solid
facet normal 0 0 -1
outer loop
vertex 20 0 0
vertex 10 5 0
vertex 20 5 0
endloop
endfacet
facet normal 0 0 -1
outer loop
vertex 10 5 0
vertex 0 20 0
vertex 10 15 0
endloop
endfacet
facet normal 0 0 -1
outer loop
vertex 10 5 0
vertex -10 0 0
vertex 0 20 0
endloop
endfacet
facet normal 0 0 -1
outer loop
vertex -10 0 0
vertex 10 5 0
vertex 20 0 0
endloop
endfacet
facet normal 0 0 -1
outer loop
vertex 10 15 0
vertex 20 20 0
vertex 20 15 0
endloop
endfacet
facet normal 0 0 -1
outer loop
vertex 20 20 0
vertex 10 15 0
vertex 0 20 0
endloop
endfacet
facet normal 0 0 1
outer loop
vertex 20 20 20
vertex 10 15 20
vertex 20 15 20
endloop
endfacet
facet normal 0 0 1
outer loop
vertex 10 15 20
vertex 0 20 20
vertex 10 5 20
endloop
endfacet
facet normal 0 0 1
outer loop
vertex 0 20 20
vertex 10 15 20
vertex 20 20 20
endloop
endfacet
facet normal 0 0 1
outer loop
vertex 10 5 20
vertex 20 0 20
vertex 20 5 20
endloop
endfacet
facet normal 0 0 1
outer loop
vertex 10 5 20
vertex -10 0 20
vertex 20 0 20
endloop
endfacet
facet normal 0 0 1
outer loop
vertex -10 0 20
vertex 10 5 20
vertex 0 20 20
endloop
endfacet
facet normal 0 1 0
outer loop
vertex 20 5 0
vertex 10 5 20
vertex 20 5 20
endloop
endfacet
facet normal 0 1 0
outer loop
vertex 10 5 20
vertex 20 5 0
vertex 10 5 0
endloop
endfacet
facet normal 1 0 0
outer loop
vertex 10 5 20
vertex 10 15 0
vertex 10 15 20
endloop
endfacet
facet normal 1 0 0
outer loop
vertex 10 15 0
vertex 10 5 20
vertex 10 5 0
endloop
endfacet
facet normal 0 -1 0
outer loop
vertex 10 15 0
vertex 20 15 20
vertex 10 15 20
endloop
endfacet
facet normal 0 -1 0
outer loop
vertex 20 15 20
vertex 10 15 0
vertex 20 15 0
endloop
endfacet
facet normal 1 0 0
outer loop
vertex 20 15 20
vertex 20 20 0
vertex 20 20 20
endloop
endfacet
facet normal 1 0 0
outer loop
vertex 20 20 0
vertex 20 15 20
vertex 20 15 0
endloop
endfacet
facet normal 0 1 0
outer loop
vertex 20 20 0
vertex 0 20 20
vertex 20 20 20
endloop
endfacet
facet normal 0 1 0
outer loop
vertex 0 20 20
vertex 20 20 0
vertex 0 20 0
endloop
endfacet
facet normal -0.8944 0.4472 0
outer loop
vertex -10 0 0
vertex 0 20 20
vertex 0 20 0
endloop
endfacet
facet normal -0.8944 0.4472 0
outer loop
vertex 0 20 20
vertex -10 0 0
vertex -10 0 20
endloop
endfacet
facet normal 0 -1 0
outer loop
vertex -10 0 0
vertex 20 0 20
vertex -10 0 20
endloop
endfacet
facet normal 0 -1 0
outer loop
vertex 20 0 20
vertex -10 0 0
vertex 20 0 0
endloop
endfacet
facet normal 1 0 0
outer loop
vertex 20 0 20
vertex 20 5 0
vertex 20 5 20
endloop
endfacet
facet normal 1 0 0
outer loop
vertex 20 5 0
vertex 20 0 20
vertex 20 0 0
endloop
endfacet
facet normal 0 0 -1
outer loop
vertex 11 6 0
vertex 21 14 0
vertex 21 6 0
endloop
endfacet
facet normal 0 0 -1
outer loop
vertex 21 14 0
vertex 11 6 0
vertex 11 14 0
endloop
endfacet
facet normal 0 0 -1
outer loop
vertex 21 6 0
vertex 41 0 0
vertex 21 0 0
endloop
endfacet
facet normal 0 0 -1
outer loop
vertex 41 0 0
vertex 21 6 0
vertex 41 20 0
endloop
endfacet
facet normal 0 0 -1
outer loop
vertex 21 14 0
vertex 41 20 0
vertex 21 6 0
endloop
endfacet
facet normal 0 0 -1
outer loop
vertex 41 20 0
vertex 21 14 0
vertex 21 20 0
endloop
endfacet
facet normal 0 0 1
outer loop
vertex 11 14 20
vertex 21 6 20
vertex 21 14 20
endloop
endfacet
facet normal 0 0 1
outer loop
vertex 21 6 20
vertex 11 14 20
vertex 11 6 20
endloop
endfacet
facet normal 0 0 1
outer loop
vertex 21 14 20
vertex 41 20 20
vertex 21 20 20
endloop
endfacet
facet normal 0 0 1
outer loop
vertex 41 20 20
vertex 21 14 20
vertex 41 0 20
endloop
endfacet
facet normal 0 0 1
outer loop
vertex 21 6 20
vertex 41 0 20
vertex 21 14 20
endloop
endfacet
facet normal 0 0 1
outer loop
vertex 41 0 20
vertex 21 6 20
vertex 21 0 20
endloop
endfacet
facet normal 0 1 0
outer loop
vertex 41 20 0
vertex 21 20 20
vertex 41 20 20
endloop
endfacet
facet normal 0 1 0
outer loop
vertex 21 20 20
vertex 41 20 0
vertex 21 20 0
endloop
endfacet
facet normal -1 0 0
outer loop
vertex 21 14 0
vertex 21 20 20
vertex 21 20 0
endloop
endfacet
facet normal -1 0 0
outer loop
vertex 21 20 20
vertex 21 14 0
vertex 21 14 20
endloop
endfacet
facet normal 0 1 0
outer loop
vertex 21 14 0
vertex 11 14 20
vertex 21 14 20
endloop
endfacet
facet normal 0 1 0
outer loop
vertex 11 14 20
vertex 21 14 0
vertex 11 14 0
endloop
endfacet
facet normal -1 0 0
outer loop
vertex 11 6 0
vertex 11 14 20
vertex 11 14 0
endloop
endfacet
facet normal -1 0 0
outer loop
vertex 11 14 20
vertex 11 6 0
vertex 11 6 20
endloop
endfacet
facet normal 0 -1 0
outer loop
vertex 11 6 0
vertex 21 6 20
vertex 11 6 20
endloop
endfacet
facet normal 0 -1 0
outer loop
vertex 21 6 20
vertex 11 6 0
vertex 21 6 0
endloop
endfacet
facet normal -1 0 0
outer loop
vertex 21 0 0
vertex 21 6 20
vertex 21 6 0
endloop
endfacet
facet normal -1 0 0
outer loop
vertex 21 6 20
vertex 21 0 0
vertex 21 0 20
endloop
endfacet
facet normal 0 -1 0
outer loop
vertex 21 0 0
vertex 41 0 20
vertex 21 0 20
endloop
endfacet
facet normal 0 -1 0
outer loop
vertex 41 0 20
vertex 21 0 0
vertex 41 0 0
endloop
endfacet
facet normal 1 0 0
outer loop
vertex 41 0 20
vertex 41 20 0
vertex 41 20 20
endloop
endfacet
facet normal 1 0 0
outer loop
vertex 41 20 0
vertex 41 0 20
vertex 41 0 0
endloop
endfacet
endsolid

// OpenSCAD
// file: hull.scad
/*
hull.scad - a library that leverages the hull() procedure
Author: Elliot Williams
github: https://gist.github.com/hexagon5un )
source: https://gist.github.com/hexagon5un/73e187dfa0404c69177795424f397ce6#file-hull-scad

Featured in the hackaday atricle: 'OPENSCAD: TIEING IT TOGETHER WITH HULL()'
https://hackaday.com/2018/02/13/openscad-tieing-it-together-with-hull/
*/
module multiHull(){
	for (i = [1 : $children-1])
		hull(){
			children(0);
			children(i);
		}
}

module sequentialHull(){
	for (i = [0: $children-2])
		hull(){
			children(i);
			children(i+1);
		}
}

/* Extended fun hull functions */ 

module cylinders(points, diameter, thickness){
	for (p=points){
		translate(p) cylinder(d=diameter, h=thickness, center=true);
	}
}

module plate(points, diameter, thickness, hole_diameter){
	difference(){
		hull() cylinders(points, diameter, thickness);
		cylinders(points, hole_diameter, 1000);
	}
}

module bar(length, width, thickness, hole_diameter){
	plate([[0,0,0], [length,0,0]], width, thickness, hole_diameter);
}

module rounded_box(points, radius, height, facets=30){
	hull(){
		for (p = points){
			translate(p)
				cylinder(r=radius, h=height, $fn=facets);
		}
	}
}

module point_cloud(points, radius=1, facets=8){
	for (p=points){
		translate(p)
			sphere(radius/cos(180/facets), $fn=facets);
		// polygon sphere circumscribed on radius
	}
}

module point_hull(points, radius=1, facets=8){
	hull(){
		point_cloud(points, radius, facets);
	}
}

// Shrink the exterior of the points so that the hull fits inside
function select(vector, i) = [ for (p=vector) p[i] ];
function axis_center(v, i) = (max(select(v, i)) - min(select(v,i)))/2;
function center(v) = [ for (i = [0,1,2]) axis_center(v, i) ];
function shrink_point(point, center, radius) = [ for (i = [0,1,2]) point[i] > center[i] ? point[i] - radius : point[i] + radius ]; 
function shrink(points, radius) = [ for (p = points) shrink_point(p, center(points), radius) ];

module interior_point_hull(points, radius=1){
	point_hull(shrink(points, radius), radius);
}

module interior_rounded_box(points, radius, height){
	rounded_box(shrink(points, radius), radius, height);
}


module mirror_copy(v = [1, 0, 0]) {
    children();
    mirror(v) children();
}
// file: basics.scad
///< Basics module
use <math.scad>;
use <utils.scad>;
use <hull.scad>;

module triangle( w, d, h ){
     difference(){
	  hyp = hyp_from_sides( d, h );
	  color( "red" )cube( [w, d, h] );
	  rotate( [ 45, 0, 0 ] )
	       translate( [ -0.01, 0, 0 ] )
	       color( "green" )cube( [w+0.2, hyp, h] );
     }
}

module tri_xy(pt1, pt2, pt3, h=1) {
     color( rands( 0,1,3 ) ) linear_extrude( height=h )
	  polygon( points=[ pt1, pt2, pt3 ] );
}

module triangle_xy( pts, h=1) {
     color( rands( 0,1,3 ) ) linear_extrude( height=h )
	  polygon( points = pts );
}

module oval(w,l, height, center = false, fn = 30) {
 scale([1, l/w, 1]) cylinder(h=height, r=w, center=center, $fn = fn);
}

module pipe( outer, inner, height, fn = 60 ){
     offset_percent = 0.25;
     inner_h = height + (offset_percent * 2 );
     difference(){
     ///< Debug with union(){
	  cylinder(r=outer, h = height, $fn = fn );
	  translate([0,0,-offset_percent]){
	       color("green",0.5)cylinder(r=inner, h = inner_h, $fn = fn );
	  }
     }
}

module rounded_pipe( r, h, fn = 60 ){
     cylinder(r = r, h = h, $fn = fn );

     color("blue")
     translate([0,0,h])
	  sphere(r, $fn = fn );

     color("red")
     translate([0,0,0])
	  sphere(r, $fn = fn );
}

/// Stackoverflow example module for a line
/// https://stackoverflow.com/questions/49533350/is-that-possible-to-draw-a-line-using-openscad-by-joining-different-points
module line(start, end, thickness = 1, fn = 30) {
    hull() {
	translate(start) sphere(thickness, $fn = fn);
	translate(end) sphere(thickness, $fn = fn);
    }
}


/*
Hulled box:

Parameterized box with rounded corners. This uses the hull.scad
to hull four cylinders around four point in space. This variation
offsets the box to zero/zero and takes in w,d,h to mesh better
with tuples.
*/
module hulled_cube( w, d, h, r = 1 ){
    points = [
	[ 0, 0, 0 ],
	[ w, 0, 0 ],
	[ 0, w, 0 ],
	[ w, w, 0 ],
	];
    resize( [w,d,h]){
	translate( [r, r,0] ){
	    rounded_box( points, radius = r, height=h );
	}
    }
}
// file: utils.scad
///< Utilities

function rand_clr() = rands( 0,1,3 );

///< Length conversions
function in2mm( i ) = ( i * 25.4 ); 
function mm2in( m ) = ( m / 25.4 );

/// This is pulled from stackoverflow
/// https://stackoverflow.com/questions/45826208/openscad-rotating-around-a-particular-point

// rotate as per a, v, but around point pt
module rotate_about_pt(a, v, pt) {
    translate(pt)
        rotate(a,v)
            translate(-pt)
                children();   
}
// file: math.scad
///< Math scad module


///< Find the hypotenuse from two sides of a right triangle
function hyp_from_sides( a, b ) = sqrt( pow( a, 2 ) + pow( b, 2 ) );

///< Find equal sides from hypotenuse of a right triangle
function sides_from_hyp(h) = sqrt( pow( h, 2 ) / 2 );

///< Find A from hypotenuse and B
function a_from_hb( h, b ) = sqrt( pow( h, 2 ) - pow( b, 2 ) );

function dist_2d( pt2, pt1 ) = sqrt(pow(( pt2[0]-pt1[0] ),2) + pow(( pt2[1]-pt1[1]),2) );

function mid_pt_2d( pt2, pt1 ) = [( pt1[0]+pt2[0] )/2, ( pt1[1]+pt2[1] )/2, 0 ];
///< Test for math functions

A = 3;
B = 4;
echo("Given A=", A, "and B=", B );
H = hyp_from_sides( A, B );
echo("Hypotenuse=", H );
echo("Calc Correct = ", (H == 5) );

echo("Given H=", H, " which is a hypotenuse with equal sides" );
echo( "the sides=", sides_from_hyp( H ) );

echo("Given H=", H, "B=", 4 );
echo("A=", a_from_hb( H, 4 ) );

echo("Distance from [-1,1] and [3,4] = ", dist_2d( [-1,1],[3,4]) );
// main file
///< Object definition
use <math.scad>;
use <utils.scad>;
use <basics.scad>;

/*
Channel lock fitting            Key fitting
				(Note symmetry)
   B                  C
      +-------------+              F +---+ G
      |             |   ( Q )        |   |
      |         (O) |	       D   E |   |
      |     E +-----+ D         +----+   |
      | (P)   |         ( R )   +        |
      |     F +-----+ G		+----+   |
      |             |   ( S )  C   B |   |
      |             |                |   |
   A  +-------------+ H            A +---+ H

   C->D  = Q
   E->F  = P
   D->G  = R (P=R)
   G->H  = S

*/

module channel_lock( width,
		     height,
		     length = 1,
		     rake = 0,
		     Q = 1,
		     R = 1,
		     S = 1,
		     O = 1,
		     P = 1,
		     origin = 0 ){

     points = [
	  [ origin - rake,    origin     ], //A
	  [ origin,           height     ], //B
	  [ width,            height     ], //C
	  [ width,            height - Q ], //D
	  [ width - O,        height - Q ], //E
	  [ width - O,        origin + S ], //F
	  [ width,            origin + S ], //G
	  [ width,            origin     ]  //H
	  ];
     linear_extrude( height = length ){
       polygon( points );
     }
}

module channel_key( width,
		    height,
		    length = 1,
		    Q = 1,
		    R = 1,
		    S = 1,
		    O = 1,
		    P = 1,
		    origin = 0 ){

     points = [
	  [ origin,         origin     ], //A
	  [ origin,         S          ], //B
	  [ origin - O,     S          ], //C
	  [ origin - O,     height - Q ], //D
	  [ origin,         height - Q ], //E
	  [ origin,         height     ], //F
	  [ origin + width, height     ], //G
	  [ origin + width, origin     ]  //H
	  ];
     linear_extrude( height = length ){
       polygon( points );
     }
}


module channel_key_pair( width,
			 height,
			 length = 1,
			 rake = 0,
			 clearance = 1,
			 Q = 1,
			 R = 1,
			 S = 1,
			 O = 1,
			 P = 1,
			 origin       = 0,
			 hide_channel = false,
			 hide_key     = false
			 ){
  if( !hide_channel ){
        color( rand_clr() )
        channel_lock(width  = width,
		     height = height,
		     length = length,
		     rake   = rake,
		     Q      = Q,
		     O      = O,
		     S      = S );
  }

  if( !hide_key ){
      color( rand_clr() )
	translate( [ (width+clearance), 0, 0 ]  )
	channel_key(  width  = width,
		      height = height,
		      length = length,
		      Q      = Q + clearance,
		      O      = O,
		      S      = S + clearance );
  }
}

channel_key_pair( width  = 20,
		  height = 20,
		  length = 20,
		  rake   = 10,
		  Q = 5,
		  O = 10,
		  S = 5);
